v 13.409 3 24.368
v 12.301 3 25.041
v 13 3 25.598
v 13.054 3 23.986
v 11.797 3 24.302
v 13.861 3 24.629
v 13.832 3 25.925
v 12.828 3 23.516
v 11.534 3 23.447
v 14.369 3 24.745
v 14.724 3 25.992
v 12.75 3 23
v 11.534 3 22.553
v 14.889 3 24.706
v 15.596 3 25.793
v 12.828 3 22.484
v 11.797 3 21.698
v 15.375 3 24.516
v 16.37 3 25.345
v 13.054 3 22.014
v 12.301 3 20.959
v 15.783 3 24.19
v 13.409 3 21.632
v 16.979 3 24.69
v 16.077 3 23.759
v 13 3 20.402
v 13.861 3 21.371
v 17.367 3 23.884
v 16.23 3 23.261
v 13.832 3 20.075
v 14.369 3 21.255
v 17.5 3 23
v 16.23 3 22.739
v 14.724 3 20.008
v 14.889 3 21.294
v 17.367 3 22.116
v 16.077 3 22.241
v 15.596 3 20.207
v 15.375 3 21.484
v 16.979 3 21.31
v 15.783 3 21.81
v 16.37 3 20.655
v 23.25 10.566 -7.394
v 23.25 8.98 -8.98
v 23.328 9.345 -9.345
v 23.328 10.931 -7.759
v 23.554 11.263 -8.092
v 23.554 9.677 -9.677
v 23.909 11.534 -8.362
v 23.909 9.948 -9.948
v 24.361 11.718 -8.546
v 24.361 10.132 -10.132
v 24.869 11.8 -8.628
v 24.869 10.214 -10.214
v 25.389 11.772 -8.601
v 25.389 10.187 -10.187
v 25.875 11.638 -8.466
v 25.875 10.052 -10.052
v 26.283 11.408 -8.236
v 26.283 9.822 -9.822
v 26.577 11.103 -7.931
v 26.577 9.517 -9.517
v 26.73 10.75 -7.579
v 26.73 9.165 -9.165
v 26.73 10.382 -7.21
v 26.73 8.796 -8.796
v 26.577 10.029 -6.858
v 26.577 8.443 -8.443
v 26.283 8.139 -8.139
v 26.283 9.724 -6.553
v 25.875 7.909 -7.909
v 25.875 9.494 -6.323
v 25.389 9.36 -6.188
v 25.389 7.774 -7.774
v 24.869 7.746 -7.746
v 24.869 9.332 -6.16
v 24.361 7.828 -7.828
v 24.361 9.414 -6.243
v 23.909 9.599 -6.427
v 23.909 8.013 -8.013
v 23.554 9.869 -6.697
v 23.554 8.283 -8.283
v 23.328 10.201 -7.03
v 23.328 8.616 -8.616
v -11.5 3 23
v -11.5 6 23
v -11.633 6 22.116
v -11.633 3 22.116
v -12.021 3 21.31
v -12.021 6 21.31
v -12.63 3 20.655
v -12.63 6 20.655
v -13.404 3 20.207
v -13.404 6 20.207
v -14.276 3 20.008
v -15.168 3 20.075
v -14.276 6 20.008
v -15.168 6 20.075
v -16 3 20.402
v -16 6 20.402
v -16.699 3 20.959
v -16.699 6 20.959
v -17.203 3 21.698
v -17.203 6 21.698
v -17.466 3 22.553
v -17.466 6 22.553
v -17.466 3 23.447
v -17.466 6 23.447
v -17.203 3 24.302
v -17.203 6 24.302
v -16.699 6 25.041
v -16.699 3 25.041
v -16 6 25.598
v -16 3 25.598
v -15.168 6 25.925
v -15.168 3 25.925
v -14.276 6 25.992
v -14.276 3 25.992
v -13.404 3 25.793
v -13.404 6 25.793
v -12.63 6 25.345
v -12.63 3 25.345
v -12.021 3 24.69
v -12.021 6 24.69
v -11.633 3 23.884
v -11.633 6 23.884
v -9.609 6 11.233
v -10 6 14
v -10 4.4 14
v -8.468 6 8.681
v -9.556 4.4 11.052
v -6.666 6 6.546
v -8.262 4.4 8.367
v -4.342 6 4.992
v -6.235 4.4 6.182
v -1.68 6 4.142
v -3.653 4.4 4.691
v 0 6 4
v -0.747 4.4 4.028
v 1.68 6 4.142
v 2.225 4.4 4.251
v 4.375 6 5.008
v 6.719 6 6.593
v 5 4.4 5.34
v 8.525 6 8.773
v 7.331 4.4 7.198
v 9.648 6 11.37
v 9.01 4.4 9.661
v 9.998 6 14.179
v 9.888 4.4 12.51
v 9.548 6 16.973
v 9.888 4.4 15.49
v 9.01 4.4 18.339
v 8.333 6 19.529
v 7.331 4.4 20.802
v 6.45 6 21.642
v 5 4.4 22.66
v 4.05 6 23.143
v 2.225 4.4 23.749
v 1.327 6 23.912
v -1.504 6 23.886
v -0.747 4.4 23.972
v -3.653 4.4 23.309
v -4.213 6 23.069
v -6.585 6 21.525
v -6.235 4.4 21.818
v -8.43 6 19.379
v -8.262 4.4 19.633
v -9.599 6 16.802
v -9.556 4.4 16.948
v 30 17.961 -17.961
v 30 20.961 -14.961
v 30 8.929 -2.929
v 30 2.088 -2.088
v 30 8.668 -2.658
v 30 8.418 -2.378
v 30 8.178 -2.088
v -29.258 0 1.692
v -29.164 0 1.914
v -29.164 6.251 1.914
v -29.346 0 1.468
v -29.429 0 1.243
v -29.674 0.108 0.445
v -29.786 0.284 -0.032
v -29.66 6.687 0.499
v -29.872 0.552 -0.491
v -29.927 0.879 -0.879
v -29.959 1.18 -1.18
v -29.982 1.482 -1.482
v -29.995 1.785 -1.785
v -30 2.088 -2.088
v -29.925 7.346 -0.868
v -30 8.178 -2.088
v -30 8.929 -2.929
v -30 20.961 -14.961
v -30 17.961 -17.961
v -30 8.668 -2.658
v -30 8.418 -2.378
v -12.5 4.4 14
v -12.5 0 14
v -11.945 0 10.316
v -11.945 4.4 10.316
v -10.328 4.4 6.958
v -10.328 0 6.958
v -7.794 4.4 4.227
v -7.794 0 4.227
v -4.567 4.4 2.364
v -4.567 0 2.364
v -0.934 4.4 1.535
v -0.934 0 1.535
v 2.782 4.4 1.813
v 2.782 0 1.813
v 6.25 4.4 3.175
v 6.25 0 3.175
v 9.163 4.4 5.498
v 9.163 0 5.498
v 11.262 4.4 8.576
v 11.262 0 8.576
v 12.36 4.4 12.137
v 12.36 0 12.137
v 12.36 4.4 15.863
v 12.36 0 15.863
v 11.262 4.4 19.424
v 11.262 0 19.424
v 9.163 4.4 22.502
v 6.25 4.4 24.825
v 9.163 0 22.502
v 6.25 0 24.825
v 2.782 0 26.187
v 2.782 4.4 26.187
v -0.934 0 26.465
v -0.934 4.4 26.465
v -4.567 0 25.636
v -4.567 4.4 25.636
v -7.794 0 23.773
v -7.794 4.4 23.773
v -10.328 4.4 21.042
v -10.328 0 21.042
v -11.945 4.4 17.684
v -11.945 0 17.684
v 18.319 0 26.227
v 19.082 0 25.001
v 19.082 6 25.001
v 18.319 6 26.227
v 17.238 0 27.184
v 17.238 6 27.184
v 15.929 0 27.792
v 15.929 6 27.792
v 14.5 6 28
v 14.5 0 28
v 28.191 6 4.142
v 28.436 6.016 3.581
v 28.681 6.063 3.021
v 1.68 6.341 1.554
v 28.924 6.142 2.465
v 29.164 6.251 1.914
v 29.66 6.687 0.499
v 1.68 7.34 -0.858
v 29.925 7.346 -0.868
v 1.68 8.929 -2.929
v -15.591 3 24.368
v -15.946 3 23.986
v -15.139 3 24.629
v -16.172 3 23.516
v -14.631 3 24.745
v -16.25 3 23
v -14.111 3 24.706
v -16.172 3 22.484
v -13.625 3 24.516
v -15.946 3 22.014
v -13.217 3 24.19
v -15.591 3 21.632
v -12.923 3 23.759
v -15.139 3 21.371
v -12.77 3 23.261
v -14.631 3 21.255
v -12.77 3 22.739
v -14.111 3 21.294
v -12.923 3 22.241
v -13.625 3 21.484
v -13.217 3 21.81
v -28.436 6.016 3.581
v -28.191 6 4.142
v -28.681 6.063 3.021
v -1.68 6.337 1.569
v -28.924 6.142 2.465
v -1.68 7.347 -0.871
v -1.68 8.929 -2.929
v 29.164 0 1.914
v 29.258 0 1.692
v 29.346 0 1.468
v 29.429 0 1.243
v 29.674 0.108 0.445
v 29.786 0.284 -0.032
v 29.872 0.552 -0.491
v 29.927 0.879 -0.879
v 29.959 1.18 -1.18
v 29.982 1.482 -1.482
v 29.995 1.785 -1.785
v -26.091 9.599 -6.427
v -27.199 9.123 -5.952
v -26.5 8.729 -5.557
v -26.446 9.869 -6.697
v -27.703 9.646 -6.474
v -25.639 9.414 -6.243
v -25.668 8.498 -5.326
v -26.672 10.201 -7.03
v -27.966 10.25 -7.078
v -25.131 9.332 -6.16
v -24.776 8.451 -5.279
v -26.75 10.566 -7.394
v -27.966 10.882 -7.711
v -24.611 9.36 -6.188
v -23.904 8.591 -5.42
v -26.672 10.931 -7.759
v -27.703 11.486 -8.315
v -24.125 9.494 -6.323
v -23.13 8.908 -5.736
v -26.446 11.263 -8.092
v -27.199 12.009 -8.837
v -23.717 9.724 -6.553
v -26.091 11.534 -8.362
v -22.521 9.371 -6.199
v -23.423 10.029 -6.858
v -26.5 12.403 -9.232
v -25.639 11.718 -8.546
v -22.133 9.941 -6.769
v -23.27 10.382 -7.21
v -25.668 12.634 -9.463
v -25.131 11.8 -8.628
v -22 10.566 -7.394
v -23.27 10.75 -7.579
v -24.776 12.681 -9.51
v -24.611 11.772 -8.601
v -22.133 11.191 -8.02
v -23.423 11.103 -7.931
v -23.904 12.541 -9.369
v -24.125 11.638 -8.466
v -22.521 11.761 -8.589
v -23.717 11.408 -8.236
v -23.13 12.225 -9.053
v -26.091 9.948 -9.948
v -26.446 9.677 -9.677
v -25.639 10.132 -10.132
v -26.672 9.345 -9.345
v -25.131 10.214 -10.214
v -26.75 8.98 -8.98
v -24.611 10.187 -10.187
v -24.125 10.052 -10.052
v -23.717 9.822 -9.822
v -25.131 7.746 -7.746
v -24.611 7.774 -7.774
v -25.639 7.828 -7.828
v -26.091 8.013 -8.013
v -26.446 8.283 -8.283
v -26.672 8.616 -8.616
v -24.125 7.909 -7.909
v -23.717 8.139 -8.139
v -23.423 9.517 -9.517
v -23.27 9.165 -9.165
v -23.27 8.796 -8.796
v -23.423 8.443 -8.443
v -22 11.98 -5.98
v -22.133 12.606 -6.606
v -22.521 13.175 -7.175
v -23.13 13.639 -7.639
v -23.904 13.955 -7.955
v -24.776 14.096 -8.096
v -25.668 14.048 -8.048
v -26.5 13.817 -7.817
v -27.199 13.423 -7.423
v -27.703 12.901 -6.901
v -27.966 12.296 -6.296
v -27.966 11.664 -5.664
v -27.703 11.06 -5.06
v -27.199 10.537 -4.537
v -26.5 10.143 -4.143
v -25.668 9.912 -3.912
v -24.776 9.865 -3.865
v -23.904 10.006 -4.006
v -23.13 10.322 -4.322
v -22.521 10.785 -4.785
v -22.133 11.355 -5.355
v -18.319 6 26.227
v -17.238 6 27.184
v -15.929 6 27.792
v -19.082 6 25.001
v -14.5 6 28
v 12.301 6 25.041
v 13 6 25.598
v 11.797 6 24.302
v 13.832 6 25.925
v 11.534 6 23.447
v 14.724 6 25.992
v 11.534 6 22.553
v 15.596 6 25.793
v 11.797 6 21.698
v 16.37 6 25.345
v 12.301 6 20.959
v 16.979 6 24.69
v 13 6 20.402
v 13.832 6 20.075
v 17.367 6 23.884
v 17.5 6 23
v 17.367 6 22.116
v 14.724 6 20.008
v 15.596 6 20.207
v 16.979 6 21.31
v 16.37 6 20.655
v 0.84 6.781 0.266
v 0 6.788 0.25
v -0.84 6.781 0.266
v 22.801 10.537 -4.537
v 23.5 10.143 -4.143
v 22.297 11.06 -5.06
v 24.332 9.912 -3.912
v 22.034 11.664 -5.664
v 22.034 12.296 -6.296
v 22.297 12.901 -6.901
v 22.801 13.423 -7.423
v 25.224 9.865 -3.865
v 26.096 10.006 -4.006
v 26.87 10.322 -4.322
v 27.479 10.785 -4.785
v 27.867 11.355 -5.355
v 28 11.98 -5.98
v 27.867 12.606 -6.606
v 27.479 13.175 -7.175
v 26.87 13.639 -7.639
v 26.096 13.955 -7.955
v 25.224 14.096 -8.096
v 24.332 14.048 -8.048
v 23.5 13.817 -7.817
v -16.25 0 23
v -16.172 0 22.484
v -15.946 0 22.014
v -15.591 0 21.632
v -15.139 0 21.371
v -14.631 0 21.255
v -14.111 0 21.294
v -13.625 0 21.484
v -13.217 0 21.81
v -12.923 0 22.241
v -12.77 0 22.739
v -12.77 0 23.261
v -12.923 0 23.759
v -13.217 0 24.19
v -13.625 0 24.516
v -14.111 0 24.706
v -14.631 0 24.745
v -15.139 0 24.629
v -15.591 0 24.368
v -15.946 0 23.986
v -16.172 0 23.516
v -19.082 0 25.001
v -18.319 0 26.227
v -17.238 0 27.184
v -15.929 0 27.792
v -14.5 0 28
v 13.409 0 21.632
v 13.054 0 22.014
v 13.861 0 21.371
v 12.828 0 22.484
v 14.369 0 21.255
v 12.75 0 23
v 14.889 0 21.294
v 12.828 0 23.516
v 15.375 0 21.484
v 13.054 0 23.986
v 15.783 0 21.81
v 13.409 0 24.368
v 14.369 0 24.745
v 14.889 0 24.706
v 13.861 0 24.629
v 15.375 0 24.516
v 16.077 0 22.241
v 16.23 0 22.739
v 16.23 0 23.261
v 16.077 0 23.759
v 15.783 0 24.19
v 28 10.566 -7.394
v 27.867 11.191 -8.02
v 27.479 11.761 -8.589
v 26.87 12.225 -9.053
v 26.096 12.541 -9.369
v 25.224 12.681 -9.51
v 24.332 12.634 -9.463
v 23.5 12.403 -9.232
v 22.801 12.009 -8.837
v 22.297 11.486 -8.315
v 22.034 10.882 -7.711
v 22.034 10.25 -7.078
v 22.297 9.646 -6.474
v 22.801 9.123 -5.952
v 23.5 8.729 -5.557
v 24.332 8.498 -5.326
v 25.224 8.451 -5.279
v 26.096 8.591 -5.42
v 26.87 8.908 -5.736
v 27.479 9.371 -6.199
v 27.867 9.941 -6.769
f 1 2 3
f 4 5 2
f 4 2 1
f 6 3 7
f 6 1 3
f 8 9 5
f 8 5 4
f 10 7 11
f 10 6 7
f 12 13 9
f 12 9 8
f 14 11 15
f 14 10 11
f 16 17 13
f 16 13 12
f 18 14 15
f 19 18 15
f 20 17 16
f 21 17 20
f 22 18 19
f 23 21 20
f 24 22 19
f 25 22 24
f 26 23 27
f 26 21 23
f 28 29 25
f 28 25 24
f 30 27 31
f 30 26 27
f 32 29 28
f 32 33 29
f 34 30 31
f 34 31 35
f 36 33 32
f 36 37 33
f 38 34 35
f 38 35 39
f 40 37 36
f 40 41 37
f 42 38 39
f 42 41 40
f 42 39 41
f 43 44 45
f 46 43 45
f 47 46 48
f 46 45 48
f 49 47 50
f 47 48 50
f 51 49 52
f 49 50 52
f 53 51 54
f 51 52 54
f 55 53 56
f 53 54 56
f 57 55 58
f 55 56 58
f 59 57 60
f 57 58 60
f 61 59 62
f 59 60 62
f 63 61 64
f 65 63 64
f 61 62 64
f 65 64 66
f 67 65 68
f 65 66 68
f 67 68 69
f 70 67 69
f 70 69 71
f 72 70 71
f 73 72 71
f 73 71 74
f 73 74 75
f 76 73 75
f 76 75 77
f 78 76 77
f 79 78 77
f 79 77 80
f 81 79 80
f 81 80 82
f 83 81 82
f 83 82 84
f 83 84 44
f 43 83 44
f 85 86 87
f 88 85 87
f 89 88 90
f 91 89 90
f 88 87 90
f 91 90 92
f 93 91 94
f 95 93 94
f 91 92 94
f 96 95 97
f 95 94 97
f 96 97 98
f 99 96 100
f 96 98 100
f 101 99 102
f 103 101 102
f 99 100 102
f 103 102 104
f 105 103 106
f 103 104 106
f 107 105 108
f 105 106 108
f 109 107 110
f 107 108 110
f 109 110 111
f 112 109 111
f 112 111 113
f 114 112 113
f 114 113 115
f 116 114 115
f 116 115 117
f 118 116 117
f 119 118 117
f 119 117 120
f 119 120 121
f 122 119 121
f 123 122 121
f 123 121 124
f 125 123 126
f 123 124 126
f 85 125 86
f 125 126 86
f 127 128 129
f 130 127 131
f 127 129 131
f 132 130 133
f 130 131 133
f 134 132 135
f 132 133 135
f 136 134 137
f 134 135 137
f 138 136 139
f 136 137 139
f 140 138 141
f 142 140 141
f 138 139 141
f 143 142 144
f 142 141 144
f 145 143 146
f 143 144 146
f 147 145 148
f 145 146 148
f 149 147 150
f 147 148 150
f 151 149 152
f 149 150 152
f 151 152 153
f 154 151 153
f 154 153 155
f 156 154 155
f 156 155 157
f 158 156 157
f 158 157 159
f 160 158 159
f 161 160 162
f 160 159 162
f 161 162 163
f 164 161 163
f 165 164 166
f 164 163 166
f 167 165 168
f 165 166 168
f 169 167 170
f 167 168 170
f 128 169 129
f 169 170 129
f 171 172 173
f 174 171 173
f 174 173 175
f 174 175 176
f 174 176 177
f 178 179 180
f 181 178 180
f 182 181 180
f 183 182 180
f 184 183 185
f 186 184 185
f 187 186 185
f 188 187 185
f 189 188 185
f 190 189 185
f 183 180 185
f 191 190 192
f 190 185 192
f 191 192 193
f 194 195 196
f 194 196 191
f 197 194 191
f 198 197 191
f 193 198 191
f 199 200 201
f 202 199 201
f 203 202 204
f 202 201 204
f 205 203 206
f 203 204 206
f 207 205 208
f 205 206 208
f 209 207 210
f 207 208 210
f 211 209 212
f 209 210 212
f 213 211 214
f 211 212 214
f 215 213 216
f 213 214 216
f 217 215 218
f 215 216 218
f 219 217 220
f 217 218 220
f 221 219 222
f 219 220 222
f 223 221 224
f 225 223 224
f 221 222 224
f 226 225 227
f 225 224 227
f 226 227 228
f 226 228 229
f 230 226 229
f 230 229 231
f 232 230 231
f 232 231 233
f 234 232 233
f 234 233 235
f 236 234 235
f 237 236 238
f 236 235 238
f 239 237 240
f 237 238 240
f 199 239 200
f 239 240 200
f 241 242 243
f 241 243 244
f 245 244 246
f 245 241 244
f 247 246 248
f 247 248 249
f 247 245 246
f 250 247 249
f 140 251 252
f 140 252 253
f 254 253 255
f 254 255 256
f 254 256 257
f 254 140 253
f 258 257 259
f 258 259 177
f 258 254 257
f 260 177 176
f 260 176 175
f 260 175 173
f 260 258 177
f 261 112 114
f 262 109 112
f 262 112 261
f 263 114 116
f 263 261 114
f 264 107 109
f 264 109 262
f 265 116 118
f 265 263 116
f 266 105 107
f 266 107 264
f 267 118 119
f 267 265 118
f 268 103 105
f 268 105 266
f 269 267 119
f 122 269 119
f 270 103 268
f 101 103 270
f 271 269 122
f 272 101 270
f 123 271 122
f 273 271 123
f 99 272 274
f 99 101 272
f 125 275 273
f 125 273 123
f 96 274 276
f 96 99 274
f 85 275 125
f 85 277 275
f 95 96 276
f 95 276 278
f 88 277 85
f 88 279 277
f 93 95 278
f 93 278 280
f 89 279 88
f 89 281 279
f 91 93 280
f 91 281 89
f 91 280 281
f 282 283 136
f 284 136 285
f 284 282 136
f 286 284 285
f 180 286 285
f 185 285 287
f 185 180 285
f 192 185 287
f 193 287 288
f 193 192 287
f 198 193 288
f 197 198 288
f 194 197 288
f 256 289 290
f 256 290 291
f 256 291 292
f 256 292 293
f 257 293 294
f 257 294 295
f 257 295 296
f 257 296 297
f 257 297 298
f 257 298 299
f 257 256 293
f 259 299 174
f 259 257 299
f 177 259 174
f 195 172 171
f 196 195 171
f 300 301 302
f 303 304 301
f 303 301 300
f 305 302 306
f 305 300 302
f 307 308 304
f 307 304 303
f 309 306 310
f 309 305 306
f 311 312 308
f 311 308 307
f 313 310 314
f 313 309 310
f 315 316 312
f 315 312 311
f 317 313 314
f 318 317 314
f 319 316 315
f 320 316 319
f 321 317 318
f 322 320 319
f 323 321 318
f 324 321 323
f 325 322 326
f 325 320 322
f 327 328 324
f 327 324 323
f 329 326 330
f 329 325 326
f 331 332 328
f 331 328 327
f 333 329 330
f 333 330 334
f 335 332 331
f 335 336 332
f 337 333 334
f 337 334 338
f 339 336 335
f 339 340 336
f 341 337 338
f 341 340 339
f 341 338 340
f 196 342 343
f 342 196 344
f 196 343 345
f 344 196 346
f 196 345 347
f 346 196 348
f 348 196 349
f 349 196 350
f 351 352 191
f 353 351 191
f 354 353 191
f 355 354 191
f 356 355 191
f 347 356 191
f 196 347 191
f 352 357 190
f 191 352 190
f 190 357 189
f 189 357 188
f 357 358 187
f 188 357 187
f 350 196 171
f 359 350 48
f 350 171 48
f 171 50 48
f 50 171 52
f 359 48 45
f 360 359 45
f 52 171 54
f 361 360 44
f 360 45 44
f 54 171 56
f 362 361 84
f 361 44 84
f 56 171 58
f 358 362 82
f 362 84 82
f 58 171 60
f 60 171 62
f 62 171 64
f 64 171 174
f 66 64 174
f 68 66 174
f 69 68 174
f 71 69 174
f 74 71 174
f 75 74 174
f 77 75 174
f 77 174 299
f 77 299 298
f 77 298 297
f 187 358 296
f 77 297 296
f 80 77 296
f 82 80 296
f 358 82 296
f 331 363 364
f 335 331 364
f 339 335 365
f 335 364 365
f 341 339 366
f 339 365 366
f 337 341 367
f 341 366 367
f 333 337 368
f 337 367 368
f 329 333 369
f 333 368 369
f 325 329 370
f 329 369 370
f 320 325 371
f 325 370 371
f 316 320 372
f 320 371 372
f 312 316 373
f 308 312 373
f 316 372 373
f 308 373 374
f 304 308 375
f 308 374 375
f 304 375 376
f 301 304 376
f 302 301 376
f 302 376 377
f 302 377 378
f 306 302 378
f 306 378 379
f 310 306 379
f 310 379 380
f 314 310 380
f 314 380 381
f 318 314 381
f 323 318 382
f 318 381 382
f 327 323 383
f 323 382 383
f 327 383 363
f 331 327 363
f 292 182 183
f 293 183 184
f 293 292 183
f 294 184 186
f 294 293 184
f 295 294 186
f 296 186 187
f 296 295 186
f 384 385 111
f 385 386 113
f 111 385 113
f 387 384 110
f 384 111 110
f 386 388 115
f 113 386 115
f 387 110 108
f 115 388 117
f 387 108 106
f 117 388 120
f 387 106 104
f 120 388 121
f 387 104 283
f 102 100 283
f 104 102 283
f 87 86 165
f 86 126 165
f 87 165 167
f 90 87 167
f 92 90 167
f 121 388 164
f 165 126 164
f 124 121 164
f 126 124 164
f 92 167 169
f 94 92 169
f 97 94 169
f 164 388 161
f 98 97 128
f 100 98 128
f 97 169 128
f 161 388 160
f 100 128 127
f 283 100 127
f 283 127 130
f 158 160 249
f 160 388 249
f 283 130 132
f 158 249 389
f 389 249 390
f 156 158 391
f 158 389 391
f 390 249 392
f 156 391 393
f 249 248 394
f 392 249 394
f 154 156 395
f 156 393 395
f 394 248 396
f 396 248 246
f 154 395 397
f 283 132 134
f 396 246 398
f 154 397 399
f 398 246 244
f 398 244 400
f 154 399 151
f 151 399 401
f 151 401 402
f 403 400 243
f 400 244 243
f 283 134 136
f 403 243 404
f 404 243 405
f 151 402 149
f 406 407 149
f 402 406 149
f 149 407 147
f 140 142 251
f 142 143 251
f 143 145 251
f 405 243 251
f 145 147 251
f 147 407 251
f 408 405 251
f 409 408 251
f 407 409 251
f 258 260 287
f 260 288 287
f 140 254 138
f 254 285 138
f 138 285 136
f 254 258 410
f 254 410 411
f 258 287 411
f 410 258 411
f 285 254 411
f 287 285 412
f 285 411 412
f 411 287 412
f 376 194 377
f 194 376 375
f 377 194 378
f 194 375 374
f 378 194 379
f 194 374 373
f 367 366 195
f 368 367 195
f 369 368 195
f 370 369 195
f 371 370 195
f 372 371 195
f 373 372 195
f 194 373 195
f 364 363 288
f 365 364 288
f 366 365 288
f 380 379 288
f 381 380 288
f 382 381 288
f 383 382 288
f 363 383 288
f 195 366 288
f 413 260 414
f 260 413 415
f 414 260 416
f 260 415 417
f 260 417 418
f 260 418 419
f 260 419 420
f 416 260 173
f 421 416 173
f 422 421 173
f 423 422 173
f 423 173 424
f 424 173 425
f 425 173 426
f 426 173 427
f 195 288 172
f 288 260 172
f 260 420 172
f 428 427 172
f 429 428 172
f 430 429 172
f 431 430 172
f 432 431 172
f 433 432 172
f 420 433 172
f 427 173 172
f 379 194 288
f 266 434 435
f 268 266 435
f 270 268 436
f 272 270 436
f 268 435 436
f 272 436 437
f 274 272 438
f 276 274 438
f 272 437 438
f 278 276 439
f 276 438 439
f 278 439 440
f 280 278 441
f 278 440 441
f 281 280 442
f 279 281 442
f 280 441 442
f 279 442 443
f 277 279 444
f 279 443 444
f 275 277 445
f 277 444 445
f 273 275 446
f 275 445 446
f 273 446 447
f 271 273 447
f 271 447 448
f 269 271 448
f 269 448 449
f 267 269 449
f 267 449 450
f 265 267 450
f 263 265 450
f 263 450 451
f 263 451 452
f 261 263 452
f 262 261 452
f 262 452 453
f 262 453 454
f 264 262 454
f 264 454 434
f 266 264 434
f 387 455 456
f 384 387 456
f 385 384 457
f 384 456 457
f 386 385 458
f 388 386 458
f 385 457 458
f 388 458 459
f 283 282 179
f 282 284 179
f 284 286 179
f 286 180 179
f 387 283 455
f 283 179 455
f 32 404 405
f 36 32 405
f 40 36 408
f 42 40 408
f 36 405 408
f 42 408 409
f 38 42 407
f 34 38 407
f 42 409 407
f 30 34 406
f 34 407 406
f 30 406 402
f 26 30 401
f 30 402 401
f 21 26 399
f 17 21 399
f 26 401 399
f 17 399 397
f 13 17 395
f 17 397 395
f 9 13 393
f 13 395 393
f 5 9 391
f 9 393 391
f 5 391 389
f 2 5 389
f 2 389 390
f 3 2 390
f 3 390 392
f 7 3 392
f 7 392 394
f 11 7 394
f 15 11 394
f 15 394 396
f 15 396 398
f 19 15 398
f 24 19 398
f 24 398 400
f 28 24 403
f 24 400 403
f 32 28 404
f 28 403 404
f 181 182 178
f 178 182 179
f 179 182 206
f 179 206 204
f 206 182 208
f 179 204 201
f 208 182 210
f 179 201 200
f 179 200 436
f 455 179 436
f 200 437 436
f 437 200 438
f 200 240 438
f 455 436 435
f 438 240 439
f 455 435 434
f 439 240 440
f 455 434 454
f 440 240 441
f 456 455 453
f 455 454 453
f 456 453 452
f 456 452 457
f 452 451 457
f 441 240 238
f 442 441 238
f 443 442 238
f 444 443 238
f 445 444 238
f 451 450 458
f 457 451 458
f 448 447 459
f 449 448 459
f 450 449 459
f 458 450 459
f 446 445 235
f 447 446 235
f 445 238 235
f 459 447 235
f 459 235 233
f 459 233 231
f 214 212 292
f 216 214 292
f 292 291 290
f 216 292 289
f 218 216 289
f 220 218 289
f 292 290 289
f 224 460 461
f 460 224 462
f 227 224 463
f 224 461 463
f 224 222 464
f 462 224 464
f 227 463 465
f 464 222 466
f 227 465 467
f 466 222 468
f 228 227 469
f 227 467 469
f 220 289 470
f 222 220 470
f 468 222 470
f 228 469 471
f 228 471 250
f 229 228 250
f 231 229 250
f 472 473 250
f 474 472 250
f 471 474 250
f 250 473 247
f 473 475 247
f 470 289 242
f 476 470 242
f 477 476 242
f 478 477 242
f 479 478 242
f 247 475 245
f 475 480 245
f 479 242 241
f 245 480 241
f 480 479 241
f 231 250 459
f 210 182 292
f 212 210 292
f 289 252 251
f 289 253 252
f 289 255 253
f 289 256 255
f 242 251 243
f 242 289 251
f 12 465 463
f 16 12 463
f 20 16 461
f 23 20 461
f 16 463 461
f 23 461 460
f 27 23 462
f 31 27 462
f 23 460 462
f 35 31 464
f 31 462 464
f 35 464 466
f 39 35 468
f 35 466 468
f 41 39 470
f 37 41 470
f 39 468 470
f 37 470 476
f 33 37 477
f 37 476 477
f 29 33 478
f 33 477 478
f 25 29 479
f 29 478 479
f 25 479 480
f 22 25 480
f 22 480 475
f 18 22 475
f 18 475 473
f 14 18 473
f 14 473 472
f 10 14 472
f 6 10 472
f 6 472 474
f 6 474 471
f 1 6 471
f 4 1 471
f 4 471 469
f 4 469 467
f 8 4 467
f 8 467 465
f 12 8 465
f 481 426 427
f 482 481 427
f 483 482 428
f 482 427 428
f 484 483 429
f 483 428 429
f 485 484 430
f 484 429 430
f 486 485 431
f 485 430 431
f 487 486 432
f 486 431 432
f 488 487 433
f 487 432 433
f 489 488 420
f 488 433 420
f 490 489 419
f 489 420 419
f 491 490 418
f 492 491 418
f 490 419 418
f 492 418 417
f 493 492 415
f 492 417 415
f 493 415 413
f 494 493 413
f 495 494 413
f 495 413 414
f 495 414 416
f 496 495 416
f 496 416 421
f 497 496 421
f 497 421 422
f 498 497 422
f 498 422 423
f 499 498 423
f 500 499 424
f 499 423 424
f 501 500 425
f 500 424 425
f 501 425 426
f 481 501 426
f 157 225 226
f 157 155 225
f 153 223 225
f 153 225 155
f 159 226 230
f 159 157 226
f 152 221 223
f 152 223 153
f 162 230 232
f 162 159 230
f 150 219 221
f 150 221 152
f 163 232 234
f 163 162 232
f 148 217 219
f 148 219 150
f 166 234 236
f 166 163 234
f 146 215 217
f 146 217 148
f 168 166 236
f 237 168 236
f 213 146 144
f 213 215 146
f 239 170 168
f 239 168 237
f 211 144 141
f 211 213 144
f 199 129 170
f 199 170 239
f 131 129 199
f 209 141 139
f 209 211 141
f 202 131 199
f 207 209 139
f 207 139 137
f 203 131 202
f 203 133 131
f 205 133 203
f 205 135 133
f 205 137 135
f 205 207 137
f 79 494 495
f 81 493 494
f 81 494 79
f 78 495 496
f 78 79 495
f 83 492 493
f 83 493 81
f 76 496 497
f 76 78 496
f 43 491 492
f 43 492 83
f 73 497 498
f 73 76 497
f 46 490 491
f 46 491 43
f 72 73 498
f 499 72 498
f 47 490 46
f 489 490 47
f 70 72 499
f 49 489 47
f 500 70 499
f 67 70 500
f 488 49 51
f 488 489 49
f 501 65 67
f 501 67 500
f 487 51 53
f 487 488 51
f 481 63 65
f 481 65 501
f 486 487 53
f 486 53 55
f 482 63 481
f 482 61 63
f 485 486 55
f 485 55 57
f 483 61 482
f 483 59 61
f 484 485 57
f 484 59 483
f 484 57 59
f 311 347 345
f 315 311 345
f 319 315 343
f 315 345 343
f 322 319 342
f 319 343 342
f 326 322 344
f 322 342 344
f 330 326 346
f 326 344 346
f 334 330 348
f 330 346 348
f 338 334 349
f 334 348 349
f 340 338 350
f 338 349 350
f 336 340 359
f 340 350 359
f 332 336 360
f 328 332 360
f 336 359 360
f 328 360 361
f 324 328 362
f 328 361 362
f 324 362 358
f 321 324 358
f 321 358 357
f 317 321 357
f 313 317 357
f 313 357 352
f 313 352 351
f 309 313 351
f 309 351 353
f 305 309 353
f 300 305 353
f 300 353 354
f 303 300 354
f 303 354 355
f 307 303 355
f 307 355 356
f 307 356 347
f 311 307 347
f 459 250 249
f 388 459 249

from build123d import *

# Parameters (mm, degrees)
SALIENTE_EXTRUIR1_DEPTH      = 30
SALIENTE_EXTRUIR1_DEPTH_BACK = 30
CROQUIS3_R                   = 1.75
CORTAR_EXTRUIR1_DEPTH        = 4.242641
CROQUIS4_R                   = 3
CORTAR_EXTRUIR2_DEPTH        = 2
CROQUIS5_R                   = 10
CROQUIS5_R_2                 = 1.75
CORTAR_EXTRUIR3_DEPTH        = 6
CROQUIS5_4_R                 = 12.5
CROQUIS5_4_R_2               = 10
CORTAR_EXTRUIR4_DEPTH        = 4.4
REDONDEO1_R                  = 10
REDONDEO2_R                  = 3
REDONDEO3_R                  = 10
CROQUIS6_R                   = 3
CORTAR_EXTRUIR5_DEPTH        = 3


with BuildPart() as part:
    # Croquis2 → Saliente-Extruir1 (new body, two sides)
    with BuildSketch(Plane(origin=(0, 0, 0), x_dir=(0, 0, -1), z_dir=(1, 0, 0))) as saliente_extruir1_sk:
        Polygon((0, 0), (-28, 0), (-28, 6), (0, 6), (14.960512242, 20.960512242), (17.960512242, 17.960512242), align=None)
    extrude(amount=SALIENTE_EXTRUIR1_DEPTH)
    extrude(saliente_extruir1_sk.sketch, amount=-SALIENTE_EXTRUIR1_DEPTH_BACK)

    # Croquis3 → Cortar-Extruir1 (cut)
    with BuildSketch(Plane(origin=(0, 0, 0), x_dir=(-1, 0, 0), z_dir=(0, -0.707106781, -0.707106781))):
        with Locations((-25, 12.7)):
            Circle(CROQUIS3_R)
        with Locations((25, 12.7)):
            Circle(CROQUIS3_R)
    extrude(amount=-CORTAR_EXTRUIR1_DEPTH, mode=Mode.SUBTRACT)

    # Croquis4 → Cortar-Extruir2 (cut)
    with BuildSketch(Plane(origin=(0, 3, 3), x_dir=(1, 0, 0), z_dir=(0, 0.707106781, 0.707106781))):
        with Locations((-25, 12.7)):
            Circle(CROQUIS4_R)
        with Locations((25, 12.7)):
            Circle(CROQUIS4_R)
    extrude(amount=-CORTAR_EXTRUIR2_DEPTH, mode=Mode.SUBTRACT)

    # Croquis5 → Cortar-Extruir3 (cut)
    with BuildSketch(Plane(origin=(0, 0, 0), x_dir=(-1, 0, 0), z_dir=(0, -1, 0))):
        with Locations((0, -14)):
            Circle(CROQUIS5_R)
        with Locations((14.5, -23)):
            Circle(CROQUIS5_R_2)
        with Locations((-14.5, -23)):
            Circle(CROQUIS5_R_2)
        with BuildLine():
            ThreePointArc((-19.082136833, -25.001005257), (-17.238153914, -27.1836005), (-14.5, -28))
            Line((-14.5, -28), (-30, -28))
            Line((-30, -28), (-30, 0))
            Line((-30, 0), (-19.082136833, -25.001005257))
        make_face()
        with BuildLine():
            Line((30, 0), (19.082136833, -25.001005257))
            ThreePointArc((19.082136833, -25.001005257), (17.238153914, -27.1836005), (14.5, -28))
            Line((14.5, -28), (30, -28))
            Line((30, -28), (30, 0))
        make_face()
    extrude(amount=-CORTAR_EXTRUIR3_DEPTH, mode=Mode.SUBTRACT)

    # Croquis5<4> → Cortar-Extruir4 (cut)
    with BuildSketch(Plane(origin=(0, 0, 0), x_dir=(-1, 0, 0), z_dir=(0, -1, 0))):
        with Locations((0, -14)):
            Circle(CROQUIS5_4_R)
        with Locations((0, -14)):
            Circle(CROQUIS5_4_R_2, mode=Mode.SUBTRACT)
    extrude(amount=-CORTAR_EXTRUIR4_DEPTH, mode=Mode.SUBTRACT)

    # Redondeo1
    redondeo1_edges = [part.edges().sort_by_distance(p)[0] for p in [
        (0, 6, 0),
    ]]
    fillet(redondeo1_edges, radius=REDONDEO1_R)

    # Redondeo2
    redondeo2_edges = [part.edges().sort_by_distance(p)[0] for p in [
        (0, 0, 0),
    ]]
    fillet(redondeo2_edges, radius=REDONDEO2_R)

    # Redondeo3
    redondeo3_edges = [part.edges().sort_by_distance(p)[0] for p in [
        (-30, 3.583831813, 0),
        (30, 3.583831813, 0),
    ]]
    fillet(redondeo3_edges, radius=REDONDEO3_R)

    # Croquis6 → Cortar-Extruir5 (cut)
    with BuildSketch(Plane(origin=(0, 6, 0), x_dir=(1, 0, 0), z_dir=(0, 1, 0))):
        with Locations((14.5, -23)):
            Circle(CROQUIS6_R)
        with Locations((-14.5, -23)):
            Circle(CROQUIS6_R)
    extrude(amount=-CORTAR_EXTRUIR5_DEPTH, mode=Mode.SUBTRACT)


solid = part.part
